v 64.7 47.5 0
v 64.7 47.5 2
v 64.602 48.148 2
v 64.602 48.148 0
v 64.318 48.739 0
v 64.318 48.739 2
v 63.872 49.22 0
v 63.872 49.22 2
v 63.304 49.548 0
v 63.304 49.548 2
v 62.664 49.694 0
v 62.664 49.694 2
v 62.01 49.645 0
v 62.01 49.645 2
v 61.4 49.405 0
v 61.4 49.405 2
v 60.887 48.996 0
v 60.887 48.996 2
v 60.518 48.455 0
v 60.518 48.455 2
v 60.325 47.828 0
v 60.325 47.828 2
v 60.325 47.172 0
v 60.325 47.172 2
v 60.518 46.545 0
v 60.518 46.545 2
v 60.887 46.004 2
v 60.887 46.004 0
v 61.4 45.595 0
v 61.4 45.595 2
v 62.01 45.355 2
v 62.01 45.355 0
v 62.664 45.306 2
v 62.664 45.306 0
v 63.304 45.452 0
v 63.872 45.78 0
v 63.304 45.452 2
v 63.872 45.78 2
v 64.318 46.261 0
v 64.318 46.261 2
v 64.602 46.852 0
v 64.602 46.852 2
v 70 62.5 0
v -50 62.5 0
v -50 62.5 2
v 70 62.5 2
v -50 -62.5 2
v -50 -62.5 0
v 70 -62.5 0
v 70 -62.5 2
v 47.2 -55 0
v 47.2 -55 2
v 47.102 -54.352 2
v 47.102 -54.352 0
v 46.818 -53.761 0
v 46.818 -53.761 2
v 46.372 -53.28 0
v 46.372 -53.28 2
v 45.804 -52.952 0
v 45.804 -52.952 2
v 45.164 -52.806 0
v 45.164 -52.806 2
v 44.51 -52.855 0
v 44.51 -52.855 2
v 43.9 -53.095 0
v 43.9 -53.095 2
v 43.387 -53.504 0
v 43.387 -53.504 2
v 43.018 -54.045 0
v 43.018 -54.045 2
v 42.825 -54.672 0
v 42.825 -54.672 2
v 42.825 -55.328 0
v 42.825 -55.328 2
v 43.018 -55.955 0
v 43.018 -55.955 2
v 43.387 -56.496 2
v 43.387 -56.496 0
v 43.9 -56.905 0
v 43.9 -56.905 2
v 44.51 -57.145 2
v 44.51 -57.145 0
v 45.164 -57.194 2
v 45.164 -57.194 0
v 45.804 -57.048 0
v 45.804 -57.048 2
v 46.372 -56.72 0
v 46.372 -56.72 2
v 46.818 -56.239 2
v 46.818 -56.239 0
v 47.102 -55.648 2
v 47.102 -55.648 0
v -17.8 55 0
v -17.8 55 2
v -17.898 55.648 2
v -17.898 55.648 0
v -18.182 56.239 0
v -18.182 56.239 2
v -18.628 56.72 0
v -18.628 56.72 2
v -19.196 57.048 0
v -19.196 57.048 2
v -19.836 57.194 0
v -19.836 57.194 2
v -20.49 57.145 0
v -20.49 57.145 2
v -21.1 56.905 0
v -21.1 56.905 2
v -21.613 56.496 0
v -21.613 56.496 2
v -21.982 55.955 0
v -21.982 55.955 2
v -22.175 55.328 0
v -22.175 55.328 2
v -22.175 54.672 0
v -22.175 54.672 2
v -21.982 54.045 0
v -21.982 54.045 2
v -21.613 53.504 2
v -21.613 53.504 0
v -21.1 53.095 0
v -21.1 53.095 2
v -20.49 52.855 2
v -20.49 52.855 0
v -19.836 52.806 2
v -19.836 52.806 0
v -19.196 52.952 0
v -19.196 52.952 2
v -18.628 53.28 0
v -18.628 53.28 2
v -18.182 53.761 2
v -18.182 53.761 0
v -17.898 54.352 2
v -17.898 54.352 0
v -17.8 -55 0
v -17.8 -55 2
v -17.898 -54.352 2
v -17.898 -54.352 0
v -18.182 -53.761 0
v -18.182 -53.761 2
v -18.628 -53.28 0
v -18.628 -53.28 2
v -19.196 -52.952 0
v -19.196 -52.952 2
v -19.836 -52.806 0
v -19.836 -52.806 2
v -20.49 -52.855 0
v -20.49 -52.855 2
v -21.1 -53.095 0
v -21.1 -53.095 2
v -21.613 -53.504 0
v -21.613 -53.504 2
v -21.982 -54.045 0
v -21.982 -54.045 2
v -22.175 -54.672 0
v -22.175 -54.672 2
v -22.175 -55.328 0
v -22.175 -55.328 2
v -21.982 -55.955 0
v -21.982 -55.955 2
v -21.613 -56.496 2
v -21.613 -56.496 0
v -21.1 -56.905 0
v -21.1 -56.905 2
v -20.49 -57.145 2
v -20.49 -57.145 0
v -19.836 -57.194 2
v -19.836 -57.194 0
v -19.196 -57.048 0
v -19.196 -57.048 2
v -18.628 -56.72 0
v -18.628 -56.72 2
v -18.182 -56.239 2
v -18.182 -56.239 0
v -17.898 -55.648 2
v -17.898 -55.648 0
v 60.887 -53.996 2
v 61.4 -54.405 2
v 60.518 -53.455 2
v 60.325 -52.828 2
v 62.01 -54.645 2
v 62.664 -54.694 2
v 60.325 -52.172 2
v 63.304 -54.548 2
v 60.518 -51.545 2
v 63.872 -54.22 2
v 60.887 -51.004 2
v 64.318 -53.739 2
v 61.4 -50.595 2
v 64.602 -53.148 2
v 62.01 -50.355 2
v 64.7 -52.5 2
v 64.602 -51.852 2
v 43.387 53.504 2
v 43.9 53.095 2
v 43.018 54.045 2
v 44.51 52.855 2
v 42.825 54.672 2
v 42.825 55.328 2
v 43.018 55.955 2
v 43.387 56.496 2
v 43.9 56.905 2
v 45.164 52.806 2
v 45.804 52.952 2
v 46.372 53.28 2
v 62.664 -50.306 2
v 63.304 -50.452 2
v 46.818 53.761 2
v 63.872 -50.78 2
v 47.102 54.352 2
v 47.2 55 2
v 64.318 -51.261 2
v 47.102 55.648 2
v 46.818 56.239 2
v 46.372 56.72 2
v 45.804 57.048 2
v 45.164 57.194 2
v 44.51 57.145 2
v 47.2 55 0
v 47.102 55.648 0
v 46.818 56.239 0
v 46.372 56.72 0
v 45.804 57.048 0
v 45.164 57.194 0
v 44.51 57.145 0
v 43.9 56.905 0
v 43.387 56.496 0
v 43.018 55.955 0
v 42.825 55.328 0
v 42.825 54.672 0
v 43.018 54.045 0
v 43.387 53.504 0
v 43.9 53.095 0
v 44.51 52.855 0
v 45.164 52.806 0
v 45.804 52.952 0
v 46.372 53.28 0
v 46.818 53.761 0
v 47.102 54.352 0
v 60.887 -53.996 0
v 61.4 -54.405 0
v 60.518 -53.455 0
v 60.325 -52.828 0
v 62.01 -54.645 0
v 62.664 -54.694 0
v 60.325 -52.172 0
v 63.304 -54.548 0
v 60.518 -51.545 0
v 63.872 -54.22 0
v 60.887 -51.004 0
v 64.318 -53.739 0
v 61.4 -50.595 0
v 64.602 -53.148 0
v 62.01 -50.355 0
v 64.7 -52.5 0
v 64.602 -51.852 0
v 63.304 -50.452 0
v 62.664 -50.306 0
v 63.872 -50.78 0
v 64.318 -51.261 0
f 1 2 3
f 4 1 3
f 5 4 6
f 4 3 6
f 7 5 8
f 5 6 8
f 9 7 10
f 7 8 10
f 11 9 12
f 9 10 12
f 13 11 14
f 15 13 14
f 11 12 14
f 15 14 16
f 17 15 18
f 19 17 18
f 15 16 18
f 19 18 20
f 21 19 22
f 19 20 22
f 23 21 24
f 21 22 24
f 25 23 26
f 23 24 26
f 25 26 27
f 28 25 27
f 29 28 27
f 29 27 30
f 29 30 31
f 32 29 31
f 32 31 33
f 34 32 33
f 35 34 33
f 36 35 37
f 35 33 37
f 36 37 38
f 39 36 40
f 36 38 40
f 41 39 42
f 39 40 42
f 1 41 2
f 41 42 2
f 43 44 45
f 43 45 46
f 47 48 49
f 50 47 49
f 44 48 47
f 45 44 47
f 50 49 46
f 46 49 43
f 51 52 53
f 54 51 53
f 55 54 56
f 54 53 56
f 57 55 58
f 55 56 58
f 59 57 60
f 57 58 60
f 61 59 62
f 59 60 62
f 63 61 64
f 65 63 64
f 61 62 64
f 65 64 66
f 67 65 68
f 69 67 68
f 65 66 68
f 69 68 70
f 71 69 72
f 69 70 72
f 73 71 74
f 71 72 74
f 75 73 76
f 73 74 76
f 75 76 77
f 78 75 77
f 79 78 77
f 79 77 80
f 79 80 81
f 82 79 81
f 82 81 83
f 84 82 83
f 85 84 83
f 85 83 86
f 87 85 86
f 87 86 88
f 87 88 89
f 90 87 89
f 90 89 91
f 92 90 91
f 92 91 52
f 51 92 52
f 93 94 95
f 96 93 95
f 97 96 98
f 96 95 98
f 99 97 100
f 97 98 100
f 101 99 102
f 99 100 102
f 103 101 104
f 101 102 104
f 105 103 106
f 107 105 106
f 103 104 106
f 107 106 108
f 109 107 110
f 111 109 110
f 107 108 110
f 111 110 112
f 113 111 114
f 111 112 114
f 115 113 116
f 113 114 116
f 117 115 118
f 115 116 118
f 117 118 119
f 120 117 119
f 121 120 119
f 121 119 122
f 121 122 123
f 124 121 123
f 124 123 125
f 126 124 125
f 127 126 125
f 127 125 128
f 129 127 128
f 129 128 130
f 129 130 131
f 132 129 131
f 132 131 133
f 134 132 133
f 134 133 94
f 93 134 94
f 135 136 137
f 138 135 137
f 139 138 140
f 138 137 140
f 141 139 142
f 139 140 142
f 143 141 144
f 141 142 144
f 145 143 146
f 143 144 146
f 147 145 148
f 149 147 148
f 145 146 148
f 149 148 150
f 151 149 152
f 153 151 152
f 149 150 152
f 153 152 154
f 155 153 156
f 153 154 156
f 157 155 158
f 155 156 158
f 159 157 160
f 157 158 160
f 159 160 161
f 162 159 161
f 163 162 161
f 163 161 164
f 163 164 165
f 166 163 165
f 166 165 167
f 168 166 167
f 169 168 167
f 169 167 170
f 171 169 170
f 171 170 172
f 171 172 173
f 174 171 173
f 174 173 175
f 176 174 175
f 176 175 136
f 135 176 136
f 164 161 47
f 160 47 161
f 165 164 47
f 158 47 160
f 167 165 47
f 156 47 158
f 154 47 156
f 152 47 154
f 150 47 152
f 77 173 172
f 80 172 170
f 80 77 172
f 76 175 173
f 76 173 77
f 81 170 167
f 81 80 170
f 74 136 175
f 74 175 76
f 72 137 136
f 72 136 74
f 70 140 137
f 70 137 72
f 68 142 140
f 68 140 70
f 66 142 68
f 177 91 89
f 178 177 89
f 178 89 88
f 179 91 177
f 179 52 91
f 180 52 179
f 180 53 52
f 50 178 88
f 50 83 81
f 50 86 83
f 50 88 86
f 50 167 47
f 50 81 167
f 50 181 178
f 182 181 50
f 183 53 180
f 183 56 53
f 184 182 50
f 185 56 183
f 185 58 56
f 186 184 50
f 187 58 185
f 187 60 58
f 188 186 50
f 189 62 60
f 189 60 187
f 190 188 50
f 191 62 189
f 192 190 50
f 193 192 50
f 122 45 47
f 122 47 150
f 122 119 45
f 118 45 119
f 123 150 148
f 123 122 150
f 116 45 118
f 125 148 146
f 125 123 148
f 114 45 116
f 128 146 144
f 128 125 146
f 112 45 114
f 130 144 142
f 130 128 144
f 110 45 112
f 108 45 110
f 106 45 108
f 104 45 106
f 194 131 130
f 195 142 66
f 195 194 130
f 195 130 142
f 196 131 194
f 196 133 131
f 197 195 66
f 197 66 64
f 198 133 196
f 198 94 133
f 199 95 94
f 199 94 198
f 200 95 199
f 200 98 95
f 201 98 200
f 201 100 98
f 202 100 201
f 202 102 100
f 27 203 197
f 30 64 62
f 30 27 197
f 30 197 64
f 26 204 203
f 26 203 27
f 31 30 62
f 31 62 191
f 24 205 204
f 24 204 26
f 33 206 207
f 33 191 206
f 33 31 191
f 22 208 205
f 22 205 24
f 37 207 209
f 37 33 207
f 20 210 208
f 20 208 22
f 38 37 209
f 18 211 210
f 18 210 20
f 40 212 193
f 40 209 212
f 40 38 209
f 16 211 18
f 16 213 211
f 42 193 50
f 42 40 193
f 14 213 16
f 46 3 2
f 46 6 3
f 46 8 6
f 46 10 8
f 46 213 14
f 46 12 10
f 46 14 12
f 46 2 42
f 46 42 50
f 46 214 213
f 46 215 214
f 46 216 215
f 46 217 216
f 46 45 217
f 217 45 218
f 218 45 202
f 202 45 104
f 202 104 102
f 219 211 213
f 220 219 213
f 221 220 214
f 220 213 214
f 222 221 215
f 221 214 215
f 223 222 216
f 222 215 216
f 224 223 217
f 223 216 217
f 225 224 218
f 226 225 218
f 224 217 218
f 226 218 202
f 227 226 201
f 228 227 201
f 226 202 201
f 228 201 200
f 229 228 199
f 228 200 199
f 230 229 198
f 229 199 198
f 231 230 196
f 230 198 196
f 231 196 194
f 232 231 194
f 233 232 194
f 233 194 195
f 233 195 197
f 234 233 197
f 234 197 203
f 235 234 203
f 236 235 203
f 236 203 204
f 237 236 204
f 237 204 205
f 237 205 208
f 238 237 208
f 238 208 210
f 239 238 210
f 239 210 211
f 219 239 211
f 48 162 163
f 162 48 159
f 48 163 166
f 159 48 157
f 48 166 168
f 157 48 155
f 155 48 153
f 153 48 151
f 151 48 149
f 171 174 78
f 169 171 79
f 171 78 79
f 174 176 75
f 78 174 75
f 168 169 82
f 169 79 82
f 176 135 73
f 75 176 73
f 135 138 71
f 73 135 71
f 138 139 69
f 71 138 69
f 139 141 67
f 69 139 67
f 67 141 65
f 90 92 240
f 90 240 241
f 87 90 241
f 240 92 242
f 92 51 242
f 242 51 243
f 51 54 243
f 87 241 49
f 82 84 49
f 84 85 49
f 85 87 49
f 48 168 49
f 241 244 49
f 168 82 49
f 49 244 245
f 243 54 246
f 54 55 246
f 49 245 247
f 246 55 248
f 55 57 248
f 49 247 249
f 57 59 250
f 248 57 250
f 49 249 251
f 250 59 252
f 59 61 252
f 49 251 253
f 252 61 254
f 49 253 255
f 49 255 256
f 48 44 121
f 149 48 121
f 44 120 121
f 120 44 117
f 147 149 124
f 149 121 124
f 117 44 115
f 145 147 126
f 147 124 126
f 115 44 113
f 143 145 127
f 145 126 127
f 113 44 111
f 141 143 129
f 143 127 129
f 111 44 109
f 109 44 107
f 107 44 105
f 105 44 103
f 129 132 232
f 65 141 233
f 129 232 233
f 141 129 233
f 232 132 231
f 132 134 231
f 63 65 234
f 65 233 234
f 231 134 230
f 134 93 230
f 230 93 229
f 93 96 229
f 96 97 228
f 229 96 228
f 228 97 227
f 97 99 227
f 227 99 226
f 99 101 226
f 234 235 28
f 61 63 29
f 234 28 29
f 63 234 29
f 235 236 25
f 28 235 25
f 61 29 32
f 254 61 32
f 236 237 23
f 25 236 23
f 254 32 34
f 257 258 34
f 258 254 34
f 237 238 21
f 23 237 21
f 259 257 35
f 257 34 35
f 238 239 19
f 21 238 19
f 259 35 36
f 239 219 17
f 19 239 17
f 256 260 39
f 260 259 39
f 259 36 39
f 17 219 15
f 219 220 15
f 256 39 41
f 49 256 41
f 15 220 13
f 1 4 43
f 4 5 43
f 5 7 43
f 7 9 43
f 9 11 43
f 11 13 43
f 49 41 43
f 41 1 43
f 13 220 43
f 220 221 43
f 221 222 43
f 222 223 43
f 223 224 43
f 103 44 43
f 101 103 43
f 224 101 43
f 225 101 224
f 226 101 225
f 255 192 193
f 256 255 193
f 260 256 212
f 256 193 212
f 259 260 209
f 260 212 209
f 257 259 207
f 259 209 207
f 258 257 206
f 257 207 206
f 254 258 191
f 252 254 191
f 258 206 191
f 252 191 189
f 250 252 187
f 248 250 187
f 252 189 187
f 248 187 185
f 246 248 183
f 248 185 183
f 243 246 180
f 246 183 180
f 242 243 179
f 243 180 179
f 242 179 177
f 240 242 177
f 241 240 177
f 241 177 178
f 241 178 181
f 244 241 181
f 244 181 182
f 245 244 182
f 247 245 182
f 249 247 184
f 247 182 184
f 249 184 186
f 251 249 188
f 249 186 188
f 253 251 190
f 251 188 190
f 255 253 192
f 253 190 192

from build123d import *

# Parameters (mm, degrees)
SKETCH_1_W          = 140
SKETCH_1_H          = 125
EXTRUDE_1_DEPTH     = 2
SKETCH_3_R          = 2.2
CUT_EXTRUDE_1_DEPTH = 2
SKETCH_6_R          = 2.2
CUT_EXTRUDE_2_DEPTH = 2
SKETCH_7_R          = 2.2
CUT_EXTRUDE_3_DEPTH = 105
SKETCH_9_W          = 2
SKETCH_9_H          = 125
CUT_EXTRUDE_5_DEPTH = 20


with BuildPart() as part:
    # ｽｹｯﾁ1 → ﾎﾞｽ - 押し出し1 (new body)
    with BuildSketch(Plane.XY):
        Rectangle(SKETCH_1_W, SKETCH_1_H)
    extrude(amount=EXTRUDE_1_DEPTH)

    # ｽｹｯﾁ3 → ｶｯﾄ - 押し出し1 (cut)
    with BuildSketch(Plane.XY.offset(2)):
        with Locations((-60, 58.5)):
            Circle(SKETCH_3_R)
        with Locations((-60, -47.5)):
            Circle(SKETCH_3_R)
    extrude(amount=-CUT_EXTRUDE_1_DEPTH, mode=Mode.SUBTRACT)

    # ｽｹｯﾁ6 → ｶｯﾄ - 押し出し2 (cut)
    with BuildSketch(Plane.XY.offset(2)):
        with Locations((62.5, -52.5)):
            Circle(SKETCH_6_R)
        with Locations((62.5, 47.5)):
            Circle(SKETCH_6_R)
    extrude(amount=-CUT_EXTRUDE_2_DEPTH, mode=Mode.SUBTRACT)

    # ｽｹｯﾁ7 → ｶｯﾄ - 押し出し3 (cut)
    with BuildSketch(Plane.XY.offset(2)):
        with BuildLine():
            ThreePointArc((42.8, 55), (45, 52.8), (47.2, 55))
            Line((47.2, 55), (45, 55))
            Line((45, 55), (42.8, 55))
        make_face()
        with BuildLine():
            Line((45, 55), (47.2, 55))
            ThreePointArc((47.2, 55), (45, 57.2), (42.8, 55))
            Line((42.8, 55), (45, 55))
        make_face()
        with Locations((-20, 55)):
            Circle(SKETCH_7_R)
        with Locations((45, -55)):
            Circle(SKETCH_7_R)
        with Locations((-20, -55)):
            Circle(SKETCH_7_R)
    extrude(amount=-CUT_EXTRUDE_3_DEPTH, mode=Mode.SUBTRACT)

    # ｽｹｯﾁ9 → ｶｯﾄ - 押し出し5 (cut)
    with BuildSketch(Plane.ZY.offset(70)):
        with Locations((1, 0)):
            Rectangle(SKETCH_9_W, SKETCH_9_H)
    extrude(amount=-CUT_EXTRUDE_5_DEPTH, mode=Mode.SUBTRACT)


solid = part.part
